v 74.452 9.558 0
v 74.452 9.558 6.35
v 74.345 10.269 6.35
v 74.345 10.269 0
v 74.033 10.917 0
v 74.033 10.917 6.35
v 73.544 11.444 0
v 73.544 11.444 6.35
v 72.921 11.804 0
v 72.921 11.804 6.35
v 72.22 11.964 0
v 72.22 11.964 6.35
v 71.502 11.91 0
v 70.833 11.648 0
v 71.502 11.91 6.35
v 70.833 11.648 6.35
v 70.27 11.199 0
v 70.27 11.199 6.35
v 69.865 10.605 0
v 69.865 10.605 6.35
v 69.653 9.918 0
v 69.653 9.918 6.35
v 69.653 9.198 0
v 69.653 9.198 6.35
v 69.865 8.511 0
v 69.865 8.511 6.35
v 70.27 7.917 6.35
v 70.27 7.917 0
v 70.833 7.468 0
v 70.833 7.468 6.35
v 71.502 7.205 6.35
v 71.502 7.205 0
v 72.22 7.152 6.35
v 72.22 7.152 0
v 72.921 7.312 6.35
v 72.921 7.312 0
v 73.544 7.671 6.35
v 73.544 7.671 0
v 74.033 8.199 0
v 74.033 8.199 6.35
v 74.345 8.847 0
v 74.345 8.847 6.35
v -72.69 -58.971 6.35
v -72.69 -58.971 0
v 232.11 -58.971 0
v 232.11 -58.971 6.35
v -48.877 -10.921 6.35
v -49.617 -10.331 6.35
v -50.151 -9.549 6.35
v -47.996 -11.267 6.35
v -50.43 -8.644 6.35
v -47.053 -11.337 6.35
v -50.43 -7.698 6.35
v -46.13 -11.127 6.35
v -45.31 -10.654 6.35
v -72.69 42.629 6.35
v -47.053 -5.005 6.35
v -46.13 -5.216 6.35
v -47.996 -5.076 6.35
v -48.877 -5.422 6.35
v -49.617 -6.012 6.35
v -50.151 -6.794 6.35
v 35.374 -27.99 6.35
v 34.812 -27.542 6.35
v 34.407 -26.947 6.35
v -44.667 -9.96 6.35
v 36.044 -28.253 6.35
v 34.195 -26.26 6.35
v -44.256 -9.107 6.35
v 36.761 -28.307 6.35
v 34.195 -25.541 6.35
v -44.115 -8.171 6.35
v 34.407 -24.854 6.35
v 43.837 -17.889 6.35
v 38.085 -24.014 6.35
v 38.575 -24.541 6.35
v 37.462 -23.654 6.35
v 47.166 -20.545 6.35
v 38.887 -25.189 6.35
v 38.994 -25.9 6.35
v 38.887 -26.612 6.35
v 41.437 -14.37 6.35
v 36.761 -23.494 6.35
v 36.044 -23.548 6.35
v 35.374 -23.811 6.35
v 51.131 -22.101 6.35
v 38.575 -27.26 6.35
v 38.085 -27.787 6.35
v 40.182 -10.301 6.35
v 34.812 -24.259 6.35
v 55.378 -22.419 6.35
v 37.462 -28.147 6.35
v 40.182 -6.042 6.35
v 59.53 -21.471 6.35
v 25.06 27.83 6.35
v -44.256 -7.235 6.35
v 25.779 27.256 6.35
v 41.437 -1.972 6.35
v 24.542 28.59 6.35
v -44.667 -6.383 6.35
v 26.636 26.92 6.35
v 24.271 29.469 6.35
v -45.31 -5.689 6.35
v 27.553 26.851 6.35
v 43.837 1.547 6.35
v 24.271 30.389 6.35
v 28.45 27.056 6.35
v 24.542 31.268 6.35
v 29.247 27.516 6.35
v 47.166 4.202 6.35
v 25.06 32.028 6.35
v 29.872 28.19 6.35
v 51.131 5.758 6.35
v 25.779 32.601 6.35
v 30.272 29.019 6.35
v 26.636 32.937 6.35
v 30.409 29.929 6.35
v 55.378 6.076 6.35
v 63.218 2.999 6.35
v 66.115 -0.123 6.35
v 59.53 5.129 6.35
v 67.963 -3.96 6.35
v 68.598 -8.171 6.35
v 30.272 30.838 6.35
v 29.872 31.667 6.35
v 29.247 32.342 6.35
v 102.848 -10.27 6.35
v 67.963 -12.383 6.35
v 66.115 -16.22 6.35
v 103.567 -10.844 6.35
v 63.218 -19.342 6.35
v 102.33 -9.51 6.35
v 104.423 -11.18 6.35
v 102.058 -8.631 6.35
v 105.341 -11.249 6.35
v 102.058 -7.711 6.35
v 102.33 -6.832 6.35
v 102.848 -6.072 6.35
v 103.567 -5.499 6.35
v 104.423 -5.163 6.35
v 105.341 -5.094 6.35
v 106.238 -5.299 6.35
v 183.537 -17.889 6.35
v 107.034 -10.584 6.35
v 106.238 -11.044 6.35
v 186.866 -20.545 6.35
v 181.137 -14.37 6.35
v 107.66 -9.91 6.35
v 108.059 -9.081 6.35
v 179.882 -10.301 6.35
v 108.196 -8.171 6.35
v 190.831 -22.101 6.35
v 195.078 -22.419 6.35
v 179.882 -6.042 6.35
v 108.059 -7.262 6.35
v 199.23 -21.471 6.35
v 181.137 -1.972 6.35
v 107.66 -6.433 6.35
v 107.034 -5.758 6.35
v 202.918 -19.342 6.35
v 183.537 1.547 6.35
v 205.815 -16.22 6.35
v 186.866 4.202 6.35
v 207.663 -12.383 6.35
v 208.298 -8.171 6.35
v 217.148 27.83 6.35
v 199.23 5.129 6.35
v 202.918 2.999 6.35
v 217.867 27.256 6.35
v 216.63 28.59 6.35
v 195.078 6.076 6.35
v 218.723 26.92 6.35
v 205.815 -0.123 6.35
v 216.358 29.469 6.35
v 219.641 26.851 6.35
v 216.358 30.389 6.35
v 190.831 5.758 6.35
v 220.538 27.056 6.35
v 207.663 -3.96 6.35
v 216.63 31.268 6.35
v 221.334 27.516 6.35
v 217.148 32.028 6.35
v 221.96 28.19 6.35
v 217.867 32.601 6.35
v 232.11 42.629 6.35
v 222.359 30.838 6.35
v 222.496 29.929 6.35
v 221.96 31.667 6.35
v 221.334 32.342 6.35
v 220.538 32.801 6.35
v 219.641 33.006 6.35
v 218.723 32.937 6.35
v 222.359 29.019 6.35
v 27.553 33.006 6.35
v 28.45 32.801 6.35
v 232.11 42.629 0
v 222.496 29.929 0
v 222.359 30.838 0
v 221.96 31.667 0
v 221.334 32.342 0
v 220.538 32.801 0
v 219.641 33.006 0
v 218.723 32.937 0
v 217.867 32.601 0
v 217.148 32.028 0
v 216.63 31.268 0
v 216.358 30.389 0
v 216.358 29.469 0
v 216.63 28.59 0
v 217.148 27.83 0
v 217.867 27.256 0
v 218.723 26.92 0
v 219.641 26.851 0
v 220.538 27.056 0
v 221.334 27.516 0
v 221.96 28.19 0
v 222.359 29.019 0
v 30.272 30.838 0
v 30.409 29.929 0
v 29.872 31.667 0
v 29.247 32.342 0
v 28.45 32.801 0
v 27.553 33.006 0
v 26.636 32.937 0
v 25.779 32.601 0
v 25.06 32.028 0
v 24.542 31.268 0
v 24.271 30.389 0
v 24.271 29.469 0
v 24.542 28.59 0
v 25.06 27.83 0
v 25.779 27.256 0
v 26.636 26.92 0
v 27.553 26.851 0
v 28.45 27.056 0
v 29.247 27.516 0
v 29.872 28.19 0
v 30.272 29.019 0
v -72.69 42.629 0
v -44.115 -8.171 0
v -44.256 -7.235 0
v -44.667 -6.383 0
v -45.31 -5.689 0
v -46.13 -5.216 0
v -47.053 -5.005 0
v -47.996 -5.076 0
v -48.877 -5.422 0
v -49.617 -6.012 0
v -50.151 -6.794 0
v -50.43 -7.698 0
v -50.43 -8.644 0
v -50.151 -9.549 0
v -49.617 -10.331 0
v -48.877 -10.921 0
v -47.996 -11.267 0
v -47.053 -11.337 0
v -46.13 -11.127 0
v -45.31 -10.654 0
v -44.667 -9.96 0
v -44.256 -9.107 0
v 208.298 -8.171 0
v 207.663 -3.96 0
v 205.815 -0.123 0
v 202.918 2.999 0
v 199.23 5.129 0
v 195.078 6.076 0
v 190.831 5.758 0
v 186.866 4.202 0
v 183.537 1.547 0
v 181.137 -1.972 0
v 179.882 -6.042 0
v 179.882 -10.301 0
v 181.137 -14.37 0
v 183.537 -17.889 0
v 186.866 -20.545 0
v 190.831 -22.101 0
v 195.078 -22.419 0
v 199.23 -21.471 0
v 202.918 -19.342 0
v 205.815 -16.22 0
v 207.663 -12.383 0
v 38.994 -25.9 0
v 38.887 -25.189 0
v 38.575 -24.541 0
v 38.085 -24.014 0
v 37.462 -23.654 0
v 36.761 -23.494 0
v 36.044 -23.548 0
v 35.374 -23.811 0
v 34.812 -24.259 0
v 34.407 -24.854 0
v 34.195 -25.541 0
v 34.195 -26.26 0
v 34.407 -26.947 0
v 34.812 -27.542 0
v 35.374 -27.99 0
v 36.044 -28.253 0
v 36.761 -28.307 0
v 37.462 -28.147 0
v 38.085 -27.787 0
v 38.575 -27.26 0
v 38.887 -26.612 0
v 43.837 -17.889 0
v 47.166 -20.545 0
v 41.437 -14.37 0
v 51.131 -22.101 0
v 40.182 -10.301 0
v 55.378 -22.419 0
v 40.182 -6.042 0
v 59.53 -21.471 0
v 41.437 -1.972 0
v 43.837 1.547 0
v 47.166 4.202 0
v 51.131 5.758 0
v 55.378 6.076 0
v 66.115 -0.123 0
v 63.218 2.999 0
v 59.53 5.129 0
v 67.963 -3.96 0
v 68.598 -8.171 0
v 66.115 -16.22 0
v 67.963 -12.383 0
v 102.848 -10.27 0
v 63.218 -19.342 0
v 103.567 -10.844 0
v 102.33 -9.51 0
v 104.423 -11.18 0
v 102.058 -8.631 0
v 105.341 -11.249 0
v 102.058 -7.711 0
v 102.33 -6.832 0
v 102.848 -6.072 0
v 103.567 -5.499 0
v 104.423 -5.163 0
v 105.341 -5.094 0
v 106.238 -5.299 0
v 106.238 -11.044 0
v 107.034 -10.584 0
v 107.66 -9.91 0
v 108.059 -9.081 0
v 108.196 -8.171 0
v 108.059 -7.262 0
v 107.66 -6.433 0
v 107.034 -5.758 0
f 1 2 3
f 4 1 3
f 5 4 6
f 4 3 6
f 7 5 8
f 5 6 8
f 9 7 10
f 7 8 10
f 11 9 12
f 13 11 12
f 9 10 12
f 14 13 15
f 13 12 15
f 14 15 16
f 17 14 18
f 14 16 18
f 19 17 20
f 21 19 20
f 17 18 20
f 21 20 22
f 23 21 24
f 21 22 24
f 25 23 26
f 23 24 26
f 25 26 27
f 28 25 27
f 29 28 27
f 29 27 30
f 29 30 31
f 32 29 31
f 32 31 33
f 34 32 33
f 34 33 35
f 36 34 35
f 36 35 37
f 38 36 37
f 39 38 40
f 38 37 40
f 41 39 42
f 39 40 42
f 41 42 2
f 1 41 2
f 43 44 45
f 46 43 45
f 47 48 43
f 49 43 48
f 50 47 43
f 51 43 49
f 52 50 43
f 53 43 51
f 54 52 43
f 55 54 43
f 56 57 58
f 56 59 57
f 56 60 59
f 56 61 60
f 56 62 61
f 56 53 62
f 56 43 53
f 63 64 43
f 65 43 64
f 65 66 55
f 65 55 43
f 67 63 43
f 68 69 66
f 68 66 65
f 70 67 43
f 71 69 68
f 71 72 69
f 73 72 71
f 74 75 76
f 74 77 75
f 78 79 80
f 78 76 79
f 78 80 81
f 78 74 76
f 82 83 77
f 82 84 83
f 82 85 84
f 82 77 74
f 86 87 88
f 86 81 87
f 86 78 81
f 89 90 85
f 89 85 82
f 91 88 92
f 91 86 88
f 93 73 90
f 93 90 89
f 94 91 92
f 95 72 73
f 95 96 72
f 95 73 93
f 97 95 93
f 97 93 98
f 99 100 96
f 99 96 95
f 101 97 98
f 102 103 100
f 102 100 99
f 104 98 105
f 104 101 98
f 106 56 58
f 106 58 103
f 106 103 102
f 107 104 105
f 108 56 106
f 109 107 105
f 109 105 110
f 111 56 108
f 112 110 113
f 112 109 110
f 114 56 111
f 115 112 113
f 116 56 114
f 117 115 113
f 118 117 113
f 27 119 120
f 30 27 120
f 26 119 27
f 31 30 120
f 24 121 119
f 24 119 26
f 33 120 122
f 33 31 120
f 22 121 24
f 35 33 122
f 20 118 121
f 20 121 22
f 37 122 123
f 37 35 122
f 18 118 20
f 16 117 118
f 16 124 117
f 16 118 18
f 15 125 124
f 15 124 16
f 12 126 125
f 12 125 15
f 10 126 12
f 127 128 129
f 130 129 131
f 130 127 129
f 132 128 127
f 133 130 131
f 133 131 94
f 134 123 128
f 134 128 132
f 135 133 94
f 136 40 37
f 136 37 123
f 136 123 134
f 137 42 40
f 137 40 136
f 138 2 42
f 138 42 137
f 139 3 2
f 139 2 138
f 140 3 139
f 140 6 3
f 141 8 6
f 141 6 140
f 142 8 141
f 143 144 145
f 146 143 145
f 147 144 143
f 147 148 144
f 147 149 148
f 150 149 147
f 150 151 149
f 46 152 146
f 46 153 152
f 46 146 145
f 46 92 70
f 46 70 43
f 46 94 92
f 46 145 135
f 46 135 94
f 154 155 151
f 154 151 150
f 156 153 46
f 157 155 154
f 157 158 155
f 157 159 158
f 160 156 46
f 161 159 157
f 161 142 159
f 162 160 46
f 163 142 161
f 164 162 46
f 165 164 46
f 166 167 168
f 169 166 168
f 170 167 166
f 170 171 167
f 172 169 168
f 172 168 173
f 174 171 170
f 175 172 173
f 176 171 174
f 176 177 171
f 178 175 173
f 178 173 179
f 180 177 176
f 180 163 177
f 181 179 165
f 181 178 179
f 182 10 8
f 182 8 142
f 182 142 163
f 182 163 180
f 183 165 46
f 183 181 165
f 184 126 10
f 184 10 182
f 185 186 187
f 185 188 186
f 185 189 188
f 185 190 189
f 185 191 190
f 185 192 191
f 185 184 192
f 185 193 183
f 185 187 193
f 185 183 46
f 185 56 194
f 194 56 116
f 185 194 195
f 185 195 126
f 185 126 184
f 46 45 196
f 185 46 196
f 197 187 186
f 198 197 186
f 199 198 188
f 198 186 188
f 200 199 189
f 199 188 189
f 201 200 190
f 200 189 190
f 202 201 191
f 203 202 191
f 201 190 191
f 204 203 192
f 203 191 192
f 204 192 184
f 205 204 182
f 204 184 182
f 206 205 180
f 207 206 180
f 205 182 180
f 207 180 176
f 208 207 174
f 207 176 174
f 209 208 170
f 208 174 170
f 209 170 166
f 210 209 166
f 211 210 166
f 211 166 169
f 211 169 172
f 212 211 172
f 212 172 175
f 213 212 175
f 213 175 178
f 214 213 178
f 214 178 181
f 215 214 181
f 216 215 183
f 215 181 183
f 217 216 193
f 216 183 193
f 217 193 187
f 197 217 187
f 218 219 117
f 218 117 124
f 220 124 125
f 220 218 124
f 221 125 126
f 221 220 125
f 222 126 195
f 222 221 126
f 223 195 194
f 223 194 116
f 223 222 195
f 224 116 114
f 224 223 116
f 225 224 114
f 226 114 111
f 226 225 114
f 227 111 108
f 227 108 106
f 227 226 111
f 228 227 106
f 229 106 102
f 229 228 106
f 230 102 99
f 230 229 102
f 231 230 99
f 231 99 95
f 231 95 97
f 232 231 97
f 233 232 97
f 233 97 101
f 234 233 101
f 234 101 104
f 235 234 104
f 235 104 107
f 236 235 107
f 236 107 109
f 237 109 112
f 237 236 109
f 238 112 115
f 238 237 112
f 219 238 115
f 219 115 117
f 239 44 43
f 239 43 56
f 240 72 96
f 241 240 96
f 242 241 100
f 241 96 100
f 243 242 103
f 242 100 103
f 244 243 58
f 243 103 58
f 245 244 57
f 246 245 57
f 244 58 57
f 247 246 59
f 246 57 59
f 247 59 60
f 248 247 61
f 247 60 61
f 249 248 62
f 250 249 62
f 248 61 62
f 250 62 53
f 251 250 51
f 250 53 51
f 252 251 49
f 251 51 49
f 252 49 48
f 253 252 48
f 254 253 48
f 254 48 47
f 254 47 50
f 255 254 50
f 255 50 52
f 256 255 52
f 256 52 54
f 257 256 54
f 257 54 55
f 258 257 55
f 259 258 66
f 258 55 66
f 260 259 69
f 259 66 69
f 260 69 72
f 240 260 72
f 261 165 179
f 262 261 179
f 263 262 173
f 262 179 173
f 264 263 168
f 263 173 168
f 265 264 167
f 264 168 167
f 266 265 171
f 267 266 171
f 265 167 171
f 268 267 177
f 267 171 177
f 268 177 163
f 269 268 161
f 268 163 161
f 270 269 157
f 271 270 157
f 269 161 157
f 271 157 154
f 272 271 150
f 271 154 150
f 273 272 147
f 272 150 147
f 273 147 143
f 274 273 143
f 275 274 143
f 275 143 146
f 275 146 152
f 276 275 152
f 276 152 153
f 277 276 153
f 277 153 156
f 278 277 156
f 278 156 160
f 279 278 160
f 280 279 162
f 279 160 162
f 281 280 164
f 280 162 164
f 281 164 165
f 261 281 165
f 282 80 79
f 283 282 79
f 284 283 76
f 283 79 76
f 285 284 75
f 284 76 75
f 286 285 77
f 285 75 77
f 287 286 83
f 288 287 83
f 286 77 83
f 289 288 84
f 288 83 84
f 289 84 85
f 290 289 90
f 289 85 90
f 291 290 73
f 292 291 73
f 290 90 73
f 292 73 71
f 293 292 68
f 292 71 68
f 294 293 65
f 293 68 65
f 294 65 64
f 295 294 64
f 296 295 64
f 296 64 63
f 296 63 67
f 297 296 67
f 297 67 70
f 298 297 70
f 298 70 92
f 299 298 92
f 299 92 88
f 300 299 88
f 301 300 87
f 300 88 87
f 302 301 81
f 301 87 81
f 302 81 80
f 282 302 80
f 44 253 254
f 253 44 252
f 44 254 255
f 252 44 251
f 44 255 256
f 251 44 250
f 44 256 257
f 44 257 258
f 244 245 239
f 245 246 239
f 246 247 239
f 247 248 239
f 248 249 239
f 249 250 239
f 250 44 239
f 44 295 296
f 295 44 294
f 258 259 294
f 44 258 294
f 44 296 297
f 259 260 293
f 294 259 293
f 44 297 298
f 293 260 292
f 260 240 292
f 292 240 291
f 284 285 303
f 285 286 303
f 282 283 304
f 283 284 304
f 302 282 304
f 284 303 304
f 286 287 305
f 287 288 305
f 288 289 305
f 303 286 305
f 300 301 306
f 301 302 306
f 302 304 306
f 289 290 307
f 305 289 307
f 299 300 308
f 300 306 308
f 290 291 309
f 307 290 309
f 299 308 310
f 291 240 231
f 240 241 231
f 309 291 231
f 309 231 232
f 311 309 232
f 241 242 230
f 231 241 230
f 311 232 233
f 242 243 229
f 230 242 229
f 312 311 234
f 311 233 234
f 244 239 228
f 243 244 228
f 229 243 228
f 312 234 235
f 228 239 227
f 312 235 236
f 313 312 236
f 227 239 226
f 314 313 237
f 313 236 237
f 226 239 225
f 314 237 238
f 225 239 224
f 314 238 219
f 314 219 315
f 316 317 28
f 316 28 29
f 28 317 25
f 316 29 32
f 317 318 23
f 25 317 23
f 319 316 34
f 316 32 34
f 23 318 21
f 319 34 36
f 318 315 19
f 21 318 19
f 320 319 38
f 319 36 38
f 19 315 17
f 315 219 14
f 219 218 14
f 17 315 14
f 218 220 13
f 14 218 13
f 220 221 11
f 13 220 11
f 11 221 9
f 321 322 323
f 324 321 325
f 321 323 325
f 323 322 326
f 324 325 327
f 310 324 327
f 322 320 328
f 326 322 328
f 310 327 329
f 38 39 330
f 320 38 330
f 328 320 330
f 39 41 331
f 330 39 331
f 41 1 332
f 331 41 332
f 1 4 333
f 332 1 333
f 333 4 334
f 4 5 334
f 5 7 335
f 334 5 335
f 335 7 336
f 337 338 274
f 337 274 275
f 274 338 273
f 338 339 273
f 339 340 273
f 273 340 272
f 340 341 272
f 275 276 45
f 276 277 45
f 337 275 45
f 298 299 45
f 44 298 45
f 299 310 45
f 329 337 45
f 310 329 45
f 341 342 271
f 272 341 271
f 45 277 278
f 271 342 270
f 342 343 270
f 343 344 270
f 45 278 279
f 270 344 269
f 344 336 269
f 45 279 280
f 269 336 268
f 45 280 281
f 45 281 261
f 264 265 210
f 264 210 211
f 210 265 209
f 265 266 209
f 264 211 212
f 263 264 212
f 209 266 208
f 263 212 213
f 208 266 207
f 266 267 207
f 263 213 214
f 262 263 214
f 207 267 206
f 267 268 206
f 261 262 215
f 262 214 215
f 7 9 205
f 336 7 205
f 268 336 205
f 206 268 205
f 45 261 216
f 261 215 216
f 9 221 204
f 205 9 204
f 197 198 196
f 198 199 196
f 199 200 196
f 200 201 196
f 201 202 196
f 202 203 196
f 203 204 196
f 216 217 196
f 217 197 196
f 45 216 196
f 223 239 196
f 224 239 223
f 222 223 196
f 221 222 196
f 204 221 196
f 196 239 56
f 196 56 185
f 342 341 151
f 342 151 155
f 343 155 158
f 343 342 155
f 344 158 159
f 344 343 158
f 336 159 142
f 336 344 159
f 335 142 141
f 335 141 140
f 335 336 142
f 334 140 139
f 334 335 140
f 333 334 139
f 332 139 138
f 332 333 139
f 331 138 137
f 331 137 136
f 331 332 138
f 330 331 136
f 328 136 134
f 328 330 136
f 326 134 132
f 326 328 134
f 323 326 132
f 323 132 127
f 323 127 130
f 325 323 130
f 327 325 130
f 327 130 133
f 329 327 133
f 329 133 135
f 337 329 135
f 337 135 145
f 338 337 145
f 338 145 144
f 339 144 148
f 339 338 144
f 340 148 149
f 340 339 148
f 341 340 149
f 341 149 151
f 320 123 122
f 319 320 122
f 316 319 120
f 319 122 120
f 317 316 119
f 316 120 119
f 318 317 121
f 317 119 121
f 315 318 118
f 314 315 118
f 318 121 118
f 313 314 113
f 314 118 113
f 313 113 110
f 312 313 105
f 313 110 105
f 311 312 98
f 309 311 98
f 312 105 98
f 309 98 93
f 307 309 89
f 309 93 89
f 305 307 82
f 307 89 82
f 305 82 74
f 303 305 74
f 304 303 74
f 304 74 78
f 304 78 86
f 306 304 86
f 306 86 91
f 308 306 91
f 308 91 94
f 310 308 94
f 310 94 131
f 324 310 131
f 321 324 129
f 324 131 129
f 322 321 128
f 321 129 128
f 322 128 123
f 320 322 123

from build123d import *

# Parameters (mm, degrees)
F0_W      = 304.8
F0_H      = 101.6
F1_DEPTH  = 6.35
F2_R      = 3.175
F3_DEPTH  = 6.35
F4_R      = 14.2875
F5_DEPTH  = 6.35
F6_R      = 14.2875
F7_DEPTH  = 6.35
F9_R      = 2.413
F10_DEPTH = 6.35
F11_R     = 3.0861
F12_DEPTH = 6.35
F13_R     = 3.0861
F14_DEPTH = 6.35
F15_R     = 3.0861
F16_DEPTH = 6.35


with BuildPart() as f1:
    # F0 (on Top) → F1 (new body)
    with BuildSketch(Plane.XY):
        with Locations((79.710026, -8.171286)):
            Rectangle(F0_W, F0_H)
    extrude(amount=F1_DEPTH)

    # F2 (on face) → F3 (cut)
    with BuildSketch(Plane.XY.offset(6.35)):
        with Locations((-47.289974, -8.171286)):
            Circle(F2_R)
    extrude(amount=-F3_DEPTH, mode=Mode.SUBTRACT)

    # F4 (on face) → F5 (cut)
    with BuildSketch(Plane.XY.offset(6.35)):
        with Locations((194.010026, -8.171286)):
            Circle(F4_R)
    extrude(amount=-F5_DEPTH, mode=Mode.SUBTRACT)

    # F6 (on face) → F7 (cut)
    with BuildSketch(Plane.XY.offset(6.35)):
        with Locations((54.310026, -8.171286)):
            Circle(F6_R)
    extrude(amount=-F7_DEPTH, mode=Mode.SUBTRACT)

    # F9 (on face) → F10 (cut)
    with BuildSketch(Plane.XY.offset(6.35)):
        with Locations((36.580826, -25.900486)):
            Circle(F9_R)
        with Locations((72.039226, 9.557914)):
            Circle(F9_R)
    extrude(amount=-F10_DEPTH, mode=Mode.SUBTRACT)

    # F11 (on face) → F12 (cut)
    with BuildSketch(Plane.XY):
        with Locations((105.110026, -8.171286)):
            Circle(F11_R)
    extrude(amount=F12_DEPTH, mode=Mode.SUBTRACT)

    # F13 (on face) → F14 (cut)
    with BuildSketch(Plane.XY):
        with Locations((27.322526, 29.928714)):
            Circle(F13_R)
    extrude(amount=F14_DEPTH, mode=Mode.SUBTRACT)

    # F15 (on face) → F16 (cut)
    with BuildSketch(Plane.XY.offset(6.35)):
        with Locations((219.410026, 29.928714)):
            Circle(F15_R)
    extrude(amount=-F16_DEPTH, mode=Mode.SUBTRACT)


solid = f1.part
